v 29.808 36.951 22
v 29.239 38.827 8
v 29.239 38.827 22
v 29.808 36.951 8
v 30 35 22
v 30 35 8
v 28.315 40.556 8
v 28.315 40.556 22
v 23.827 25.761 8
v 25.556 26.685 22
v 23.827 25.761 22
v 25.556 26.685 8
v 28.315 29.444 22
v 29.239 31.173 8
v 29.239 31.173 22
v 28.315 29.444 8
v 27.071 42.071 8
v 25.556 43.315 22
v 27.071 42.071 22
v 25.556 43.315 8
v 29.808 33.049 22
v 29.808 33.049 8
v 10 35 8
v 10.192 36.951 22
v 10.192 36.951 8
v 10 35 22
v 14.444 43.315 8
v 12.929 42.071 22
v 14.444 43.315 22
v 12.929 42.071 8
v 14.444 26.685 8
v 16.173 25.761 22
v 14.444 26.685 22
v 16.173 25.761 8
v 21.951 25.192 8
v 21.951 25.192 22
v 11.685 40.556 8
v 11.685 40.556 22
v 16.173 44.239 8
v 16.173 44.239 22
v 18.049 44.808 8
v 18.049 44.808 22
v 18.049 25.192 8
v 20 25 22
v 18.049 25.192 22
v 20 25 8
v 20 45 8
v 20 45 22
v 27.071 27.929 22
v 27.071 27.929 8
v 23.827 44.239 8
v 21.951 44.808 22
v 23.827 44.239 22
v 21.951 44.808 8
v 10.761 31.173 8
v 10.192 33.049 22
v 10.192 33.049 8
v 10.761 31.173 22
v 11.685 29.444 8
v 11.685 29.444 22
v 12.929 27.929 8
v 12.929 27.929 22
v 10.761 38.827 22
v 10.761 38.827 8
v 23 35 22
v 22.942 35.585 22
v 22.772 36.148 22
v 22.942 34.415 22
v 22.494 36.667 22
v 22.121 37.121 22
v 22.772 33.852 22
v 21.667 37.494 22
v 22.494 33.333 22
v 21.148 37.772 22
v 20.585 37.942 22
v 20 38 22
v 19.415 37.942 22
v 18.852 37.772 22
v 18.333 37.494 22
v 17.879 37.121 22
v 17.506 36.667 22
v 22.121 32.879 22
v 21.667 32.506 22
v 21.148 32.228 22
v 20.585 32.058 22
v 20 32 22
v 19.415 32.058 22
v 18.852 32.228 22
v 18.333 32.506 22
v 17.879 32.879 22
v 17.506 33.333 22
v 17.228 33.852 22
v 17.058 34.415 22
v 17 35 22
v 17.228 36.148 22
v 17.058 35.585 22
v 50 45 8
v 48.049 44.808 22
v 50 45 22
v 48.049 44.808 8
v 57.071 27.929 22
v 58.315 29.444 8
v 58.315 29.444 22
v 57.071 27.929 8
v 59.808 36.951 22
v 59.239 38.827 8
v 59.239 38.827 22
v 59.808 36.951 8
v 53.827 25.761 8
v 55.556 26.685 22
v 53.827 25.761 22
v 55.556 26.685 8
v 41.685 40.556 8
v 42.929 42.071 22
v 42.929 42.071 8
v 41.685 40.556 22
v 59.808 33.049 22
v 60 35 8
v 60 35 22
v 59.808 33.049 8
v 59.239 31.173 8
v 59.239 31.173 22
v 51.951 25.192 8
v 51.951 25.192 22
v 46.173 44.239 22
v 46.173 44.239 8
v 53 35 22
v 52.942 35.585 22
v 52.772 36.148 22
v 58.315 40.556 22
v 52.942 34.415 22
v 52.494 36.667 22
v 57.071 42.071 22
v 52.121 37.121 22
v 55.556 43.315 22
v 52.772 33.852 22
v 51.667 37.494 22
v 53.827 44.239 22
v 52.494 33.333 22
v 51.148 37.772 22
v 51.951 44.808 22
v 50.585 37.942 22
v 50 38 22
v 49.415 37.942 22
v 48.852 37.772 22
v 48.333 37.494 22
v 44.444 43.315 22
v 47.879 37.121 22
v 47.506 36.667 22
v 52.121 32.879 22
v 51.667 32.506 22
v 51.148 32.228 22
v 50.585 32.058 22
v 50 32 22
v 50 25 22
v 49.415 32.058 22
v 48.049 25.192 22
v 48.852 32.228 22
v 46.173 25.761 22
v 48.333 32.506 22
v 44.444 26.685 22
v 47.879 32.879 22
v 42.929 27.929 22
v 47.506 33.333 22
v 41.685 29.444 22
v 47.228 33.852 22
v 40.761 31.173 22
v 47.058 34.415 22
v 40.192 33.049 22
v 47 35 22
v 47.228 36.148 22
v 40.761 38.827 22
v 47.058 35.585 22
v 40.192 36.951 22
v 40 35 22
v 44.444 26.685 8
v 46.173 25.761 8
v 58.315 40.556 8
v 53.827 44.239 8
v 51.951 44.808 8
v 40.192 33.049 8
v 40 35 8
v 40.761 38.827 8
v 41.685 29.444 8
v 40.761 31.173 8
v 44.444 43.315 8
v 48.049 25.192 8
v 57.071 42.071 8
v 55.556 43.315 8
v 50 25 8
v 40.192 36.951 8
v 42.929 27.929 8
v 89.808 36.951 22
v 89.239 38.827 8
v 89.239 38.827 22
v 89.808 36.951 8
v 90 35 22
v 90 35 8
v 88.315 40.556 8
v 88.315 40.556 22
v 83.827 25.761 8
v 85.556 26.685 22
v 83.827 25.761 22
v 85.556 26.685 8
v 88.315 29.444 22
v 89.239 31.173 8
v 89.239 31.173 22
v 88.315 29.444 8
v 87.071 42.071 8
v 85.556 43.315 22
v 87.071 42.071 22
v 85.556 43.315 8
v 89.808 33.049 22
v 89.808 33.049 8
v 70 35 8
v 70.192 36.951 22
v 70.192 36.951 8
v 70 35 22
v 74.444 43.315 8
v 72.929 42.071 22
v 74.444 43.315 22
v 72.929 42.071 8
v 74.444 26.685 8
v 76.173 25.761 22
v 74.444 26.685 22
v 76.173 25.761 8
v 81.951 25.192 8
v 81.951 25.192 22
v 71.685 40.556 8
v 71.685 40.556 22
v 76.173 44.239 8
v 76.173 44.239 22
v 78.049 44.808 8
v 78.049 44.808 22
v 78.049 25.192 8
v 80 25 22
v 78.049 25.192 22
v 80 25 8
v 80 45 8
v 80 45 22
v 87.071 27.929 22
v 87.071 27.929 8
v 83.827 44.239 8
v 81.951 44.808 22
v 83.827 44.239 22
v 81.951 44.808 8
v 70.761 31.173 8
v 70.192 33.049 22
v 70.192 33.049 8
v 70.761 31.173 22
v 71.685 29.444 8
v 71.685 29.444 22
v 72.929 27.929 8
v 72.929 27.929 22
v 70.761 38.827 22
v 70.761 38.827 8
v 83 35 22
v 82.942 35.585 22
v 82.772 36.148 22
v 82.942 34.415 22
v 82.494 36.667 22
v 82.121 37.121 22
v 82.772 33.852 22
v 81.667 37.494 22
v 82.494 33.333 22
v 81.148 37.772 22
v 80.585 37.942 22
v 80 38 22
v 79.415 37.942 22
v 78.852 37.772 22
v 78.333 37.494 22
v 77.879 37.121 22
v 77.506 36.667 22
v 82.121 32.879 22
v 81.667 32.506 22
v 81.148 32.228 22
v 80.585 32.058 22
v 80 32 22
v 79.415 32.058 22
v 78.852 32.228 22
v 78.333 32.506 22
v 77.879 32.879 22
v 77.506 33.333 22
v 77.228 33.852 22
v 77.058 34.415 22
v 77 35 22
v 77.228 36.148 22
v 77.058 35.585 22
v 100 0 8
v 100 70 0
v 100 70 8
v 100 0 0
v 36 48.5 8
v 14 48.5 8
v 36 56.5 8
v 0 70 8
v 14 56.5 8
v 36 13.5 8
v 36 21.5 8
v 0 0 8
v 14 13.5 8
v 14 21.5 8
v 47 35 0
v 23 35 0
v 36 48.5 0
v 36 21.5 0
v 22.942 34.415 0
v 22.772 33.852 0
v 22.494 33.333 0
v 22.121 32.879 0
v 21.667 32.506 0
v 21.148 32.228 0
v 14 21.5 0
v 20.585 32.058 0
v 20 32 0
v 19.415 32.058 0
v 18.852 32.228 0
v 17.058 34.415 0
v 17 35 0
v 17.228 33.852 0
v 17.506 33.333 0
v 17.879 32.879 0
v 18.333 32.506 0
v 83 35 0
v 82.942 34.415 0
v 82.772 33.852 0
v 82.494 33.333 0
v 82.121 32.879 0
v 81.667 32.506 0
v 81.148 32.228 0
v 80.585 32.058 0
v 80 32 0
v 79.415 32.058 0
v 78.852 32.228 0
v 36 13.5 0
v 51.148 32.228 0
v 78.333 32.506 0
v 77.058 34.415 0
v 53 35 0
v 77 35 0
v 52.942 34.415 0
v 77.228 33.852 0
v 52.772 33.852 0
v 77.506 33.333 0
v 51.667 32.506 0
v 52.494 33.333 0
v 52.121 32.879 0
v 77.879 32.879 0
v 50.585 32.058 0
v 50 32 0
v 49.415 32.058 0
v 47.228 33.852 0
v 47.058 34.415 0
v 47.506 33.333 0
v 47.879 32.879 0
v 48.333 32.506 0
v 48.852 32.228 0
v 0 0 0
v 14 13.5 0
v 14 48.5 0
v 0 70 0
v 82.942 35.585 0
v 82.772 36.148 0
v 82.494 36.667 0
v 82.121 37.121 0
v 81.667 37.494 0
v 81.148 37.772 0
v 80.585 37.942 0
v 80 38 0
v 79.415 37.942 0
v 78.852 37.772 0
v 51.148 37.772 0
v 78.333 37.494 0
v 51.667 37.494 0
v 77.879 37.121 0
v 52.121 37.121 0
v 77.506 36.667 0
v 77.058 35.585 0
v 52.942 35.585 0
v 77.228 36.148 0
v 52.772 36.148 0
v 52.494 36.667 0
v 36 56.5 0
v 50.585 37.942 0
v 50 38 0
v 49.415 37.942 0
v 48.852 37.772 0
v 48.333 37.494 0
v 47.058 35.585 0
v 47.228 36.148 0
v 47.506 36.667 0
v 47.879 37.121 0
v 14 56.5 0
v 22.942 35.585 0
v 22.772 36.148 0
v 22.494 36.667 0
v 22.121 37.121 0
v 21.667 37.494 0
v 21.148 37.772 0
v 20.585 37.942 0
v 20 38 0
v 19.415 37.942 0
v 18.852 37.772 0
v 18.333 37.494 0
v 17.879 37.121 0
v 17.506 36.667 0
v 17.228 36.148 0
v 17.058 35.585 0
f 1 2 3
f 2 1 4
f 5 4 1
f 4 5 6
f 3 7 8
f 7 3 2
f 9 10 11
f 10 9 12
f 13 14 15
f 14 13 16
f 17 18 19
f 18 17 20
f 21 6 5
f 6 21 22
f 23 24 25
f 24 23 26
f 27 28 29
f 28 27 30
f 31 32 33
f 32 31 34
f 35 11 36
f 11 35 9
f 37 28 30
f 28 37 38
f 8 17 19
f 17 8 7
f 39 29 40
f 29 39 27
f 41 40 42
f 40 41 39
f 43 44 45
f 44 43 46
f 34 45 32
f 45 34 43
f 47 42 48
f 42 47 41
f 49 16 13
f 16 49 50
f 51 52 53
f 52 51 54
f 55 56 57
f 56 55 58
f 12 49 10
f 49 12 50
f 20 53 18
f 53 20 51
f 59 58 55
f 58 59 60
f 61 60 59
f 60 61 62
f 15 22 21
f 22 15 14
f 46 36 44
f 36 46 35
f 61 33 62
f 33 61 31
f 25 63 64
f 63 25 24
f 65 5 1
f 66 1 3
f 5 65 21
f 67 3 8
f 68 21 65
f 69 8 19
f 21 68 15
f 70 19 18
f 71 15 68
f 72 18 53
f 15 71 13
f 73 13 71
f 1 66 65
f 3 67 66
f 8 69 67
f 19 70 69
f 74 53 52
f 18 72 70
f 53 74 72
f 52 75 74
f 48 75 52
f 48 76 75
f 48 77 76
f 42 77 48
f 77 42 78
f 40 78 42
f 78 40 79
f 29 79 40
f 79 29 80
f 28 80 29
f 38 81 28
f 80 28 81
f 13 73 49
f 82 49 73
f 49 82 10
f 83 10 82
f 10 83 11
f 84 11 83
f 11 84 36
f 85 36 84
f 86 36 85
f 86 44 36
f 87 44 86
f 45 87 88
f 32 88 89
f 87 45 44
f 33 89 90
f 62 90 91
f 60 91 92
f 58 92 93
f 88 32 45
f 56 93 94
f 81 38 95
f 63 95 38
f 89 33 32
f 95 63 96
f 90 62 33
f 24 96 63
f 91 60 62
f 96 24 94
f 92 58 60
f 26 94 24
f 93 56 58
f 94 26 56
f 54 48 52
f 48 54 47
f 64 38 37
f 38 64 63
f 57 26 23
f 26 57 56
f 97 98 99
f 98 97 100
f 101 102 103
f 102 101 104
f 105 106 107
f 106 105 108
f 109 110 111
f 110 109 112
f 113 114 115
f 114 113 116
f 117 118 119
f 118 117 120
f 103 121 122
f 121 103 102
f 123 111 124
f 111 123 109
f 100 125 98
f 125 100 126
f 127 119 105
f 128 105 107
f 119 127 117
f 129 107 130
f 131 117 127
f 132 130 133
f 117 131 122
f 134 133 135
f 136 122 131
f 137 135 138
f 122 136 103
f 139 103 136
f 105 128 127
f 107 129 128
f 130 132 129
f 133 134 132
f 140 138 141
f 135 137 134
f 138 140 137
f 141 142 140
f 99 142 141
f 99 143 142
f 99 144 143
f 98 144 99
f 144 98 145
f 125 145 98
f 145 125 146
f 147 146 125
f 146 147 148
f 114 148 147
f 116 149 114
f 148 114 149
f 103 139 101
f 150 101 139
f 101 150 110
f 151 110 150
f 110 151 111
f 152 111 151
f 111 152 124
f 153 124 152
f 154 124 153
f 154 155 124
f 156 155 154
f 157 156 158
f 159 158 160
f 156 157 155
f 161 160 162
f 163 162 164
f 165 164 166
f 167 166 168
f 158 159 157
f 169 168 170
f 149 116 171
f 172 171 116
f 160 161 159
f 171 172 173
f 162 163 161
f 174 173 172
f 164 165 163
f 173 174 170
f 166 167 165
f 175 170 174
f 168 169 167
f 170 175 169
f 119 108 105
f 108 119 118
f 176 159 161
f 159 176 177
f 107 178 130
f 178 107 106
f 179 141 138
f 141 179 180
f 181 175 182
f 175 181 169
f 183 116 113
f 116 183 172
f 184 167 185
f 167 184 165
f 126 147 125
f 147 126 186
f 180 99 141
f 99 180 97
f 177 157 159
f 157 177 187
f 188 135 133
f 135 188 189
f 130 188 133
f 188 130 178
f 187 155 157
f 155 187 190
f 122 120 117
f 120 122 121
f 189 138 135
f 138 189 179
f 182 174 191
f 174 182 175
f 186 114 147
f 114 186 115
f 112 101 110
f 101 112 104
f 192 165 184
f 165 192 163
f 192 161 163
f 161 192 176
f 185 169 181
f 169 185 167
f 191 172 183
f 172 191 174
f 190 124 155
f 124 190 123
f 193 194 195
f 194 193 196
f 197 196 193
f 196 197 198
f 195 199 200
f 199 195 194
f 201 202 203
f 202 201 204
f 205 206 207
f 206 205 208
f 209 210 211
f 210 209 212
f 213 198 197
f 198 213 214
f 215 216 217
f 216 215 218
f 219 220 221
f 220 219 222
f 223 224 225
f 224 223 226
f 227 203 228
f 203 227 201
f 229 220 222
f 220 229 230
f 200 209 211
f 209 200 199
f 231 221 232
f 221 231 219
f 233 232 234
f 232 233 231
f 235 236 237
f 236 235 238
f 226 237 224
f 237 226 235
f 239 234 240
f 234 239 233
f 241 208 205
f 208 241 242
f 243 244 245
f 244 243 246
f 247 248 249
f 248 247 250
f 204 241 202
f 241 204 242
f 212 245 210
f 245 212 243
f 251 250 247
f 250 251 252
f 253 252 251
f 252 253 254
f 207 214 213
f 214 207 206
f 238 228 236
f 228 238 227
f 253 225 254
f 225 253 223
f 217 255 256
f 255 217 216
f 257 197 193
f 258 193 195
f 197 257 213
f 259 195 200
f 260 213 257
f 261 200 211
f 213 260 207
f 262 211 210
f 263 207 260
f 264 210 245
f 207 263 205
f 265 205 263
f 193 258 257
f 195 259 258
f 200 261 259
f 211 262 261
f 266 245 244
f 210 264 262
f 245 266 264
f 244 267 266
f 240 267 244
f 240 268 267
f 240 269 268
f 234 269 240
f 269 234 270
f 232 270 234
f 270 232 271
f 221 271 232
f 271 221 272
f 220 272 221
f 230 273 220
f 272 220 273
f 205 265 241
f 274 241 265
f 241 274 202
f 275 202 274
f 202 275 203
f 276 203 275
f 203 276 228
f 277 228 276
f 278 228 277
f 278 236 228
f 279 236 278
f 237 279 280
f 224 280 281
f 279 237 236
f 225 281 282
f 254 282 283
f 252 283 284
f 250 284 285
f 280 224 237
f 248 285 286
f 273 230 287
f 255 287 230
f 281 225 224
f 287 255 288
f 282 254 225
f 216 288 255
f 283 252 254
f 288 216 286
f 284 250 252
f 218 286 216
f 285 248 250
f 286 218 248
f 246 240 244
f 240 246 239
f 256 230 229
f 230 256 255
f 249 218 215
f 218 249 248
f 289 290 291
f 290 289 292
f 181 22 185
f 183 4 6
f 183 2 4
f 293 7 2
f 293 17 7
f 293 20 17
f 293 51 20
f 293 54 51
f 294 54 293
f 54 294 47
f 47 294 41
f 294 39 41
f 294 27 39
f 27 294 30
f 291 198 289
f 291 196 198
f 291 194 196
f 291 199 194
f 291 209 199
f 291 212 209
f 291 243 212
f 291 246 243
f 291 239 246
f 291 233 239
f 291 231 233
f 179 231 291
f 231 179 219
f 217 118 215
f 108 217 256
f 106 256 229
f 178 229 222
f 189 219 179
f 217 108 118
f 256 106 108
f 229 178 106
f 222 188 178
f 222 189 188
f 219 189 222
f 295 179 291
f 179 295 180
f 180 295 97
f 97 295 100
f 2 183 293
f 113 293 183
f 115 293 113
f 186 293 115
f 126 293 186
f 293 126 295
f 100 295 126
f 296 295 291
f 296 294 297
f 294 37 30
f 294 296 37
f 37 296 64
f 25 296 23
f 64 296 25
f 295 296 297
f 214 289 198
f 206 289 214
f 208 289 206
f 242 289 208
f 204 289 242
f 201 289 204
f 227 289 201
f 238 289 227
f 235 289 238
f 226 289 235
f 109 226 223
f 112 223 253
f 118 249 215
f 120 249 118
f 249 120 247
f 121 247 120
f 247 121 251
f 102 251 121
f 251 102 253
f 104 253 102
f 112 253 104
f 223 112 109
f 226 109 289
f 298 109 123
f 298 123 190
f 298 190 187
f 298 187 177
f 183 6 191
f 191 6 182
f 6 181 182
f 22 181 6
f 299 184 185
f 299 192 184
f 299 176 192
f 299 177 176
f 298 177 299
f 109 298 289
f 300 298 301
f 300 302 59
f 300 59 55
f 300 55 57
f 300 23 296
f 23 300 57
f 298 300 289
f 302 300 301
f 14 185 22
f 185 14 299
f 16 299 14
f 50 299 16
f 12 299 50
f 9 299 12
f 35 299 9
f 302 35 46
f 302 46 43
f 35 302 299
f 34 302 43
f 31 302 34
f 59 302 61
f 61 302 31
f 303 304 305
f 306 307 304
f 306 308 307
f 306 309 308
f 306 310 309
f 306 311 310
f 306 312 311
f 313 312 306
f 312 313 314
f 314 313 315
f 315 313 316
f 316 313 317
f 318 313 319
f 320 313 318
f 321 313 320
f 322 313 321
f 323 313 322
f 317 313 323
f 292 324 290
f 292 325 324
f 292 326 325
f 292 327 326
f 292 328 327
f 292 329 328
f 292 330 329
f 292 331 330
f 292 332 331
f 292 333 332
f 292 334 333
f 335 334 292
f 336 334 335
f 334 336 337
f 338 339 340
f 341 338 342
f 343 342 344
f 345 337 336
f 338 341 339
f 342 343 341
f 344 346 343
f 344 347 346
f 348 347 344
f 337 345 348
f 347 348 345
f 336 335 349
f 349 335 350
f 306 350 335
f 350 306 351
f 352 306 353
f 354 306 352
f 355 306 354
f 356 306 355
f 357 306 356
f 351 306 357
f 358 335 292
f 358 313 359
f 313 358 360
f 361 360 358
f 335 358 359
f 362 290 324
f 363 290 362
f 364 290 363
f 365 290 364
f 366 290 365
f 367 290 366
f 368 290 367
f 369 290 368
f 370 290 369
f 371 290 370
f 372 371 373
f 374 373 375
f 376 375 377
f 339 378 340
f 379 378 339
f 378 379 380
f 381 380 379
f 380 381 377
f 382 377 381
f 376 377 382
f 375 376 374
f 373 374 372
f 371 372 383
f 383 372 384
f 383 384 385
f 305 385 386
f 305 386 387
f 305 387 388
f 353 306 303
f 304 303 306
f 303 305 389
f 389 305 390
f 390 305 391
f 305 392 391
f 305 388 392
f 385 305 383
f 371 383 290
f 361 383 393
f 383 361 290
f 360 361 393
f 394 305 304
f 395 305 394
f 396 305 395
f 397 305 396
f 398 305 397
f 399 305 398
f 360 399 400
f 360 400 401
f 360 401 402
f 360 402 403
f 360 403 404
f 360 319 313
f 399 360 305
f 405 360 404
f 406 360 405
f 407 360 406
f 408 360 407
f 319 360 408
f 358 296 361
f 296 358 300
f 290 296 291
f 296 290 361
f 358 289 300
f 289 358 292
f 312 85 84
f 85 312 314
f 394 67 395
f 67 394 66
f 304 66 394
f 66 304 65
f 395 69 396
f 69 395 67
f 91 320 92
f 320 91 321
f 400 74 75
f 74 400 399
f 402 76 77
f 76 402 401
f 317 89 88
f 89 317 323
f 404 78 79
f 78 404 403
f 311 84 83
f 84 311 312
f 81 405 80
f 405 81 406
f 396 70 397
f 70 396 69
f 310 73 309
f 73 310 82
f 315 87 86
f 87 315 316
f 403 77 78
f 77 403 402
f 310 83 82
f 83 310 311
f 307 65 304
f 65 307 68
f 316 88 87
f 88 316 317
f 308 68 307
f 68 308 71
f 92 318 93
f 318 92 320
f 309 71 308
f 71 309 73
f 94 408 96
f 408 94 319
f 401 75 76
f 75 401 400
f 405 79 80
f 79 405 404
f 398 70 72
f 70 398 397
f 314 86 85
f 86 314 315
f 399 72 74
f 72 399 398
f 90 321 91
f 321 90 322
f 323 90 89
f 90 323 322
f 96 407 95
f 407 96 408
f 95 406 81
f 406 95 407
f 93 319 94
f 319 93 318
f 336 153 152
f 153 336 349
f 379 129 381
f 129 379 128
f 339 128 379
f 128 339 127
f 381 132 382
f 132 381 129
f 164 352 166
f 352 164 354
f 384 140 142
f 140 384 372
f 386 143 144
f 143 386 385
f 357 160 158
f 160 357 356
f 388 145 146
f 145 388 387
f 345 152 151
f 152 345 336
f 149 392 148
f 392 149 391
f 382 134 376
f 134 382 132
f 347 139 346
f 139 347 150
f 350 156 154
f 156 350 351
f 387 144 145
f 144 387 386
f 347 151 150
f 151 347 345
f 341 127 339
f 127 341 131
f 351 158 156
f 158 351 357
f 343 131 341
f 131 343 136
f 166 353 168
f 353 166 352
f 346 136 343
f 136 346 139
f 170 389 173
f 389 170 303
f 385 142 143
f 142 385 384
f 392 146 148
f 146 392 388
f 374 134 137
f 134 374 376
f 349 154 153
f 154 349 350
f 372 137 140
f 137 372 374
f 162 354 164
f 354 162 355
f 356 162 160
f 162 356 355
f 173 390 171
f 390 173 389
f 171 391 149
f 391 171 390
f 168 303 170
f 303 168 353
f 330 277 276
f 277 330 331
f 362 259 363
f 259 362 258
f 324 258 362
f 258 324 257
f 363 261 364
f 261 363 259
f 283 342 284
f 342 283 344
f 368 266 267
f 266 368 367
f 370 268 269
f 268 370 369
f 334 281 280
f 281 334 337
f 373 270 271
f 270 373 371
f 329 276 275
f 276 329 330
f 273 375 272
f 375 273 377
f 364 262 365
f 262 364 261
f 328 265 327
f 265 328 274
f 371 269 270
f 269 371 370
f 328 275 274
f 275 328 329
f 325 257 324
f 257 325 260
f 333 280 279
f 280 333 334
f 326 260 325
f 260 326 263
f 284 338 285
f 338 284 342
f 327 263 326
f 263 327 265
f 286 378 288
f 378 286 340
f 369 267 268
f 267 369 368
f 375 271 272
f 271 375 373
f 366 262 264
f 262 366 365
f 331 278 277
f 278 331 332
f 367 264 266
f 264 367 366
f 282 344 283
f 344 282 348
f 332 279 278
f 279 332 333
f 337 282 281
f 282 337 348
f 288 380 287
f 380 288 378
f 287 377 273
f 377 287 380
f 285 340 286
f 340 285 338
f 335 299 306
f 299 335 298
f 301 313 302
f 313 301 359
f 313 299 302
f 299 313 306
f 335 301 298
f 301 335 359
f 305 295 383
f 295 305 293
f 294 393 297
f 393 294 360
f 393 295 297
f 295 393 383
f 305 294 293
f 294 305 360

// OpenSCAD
$fn = 32;

// ----------------------------------------------------------------------
// Drill jig: three_boss_slot jig
// ----------------------------------------------------------------------

// --- parameters (mm) ---
plate_l = 100;            // plate length, X
plate_w = 70;             // plate width, Y
plate_t = 8;              // plate thickness
boss_d = 20;              // guide boss diameter
boss_h = 15;              // boss height above the plate
guide_d = 6;              // guide hole diameter
boss_pitch = 30;          // boss pitch
slot_w = 8;               // clamp slot width
slot_l = 22;              // clamp slot length
slot_x = 14;              // slot start X

n_boss = 3;  // guide bosses
boss_x0 = (plate_l - (n_boss - 1) * boss_pitch) / 2;  // first boss X
boss_top = plate_t - 1 + boss_h;  // boss crown height
total_h = boss_top;  // overall height

difference() {
  union() {
  cube([plate_l, plate_w, plate_t]);
  for (i = [0 : n_boss - 1])
    translate([boss_x0 + i * boss_pitch, plate_w / 2, plate_t - 1])
      cylinder(h = boss_h, d = boss_d);
  }
  for (i = [0 : n_boss - 1])
    translate([boss_x0 + i * boss_pitch, plate_w / 2, -1])
      cylinder(h = plate_t + boss_h, d = guide_d);
  for (cy = [plate_w * 0.25, plate_w * 0.75])
    translate([slot_x, cy - slot_w / 2, -1])
      cube([slot_l, slot_w, plate_t + 2]);
}
